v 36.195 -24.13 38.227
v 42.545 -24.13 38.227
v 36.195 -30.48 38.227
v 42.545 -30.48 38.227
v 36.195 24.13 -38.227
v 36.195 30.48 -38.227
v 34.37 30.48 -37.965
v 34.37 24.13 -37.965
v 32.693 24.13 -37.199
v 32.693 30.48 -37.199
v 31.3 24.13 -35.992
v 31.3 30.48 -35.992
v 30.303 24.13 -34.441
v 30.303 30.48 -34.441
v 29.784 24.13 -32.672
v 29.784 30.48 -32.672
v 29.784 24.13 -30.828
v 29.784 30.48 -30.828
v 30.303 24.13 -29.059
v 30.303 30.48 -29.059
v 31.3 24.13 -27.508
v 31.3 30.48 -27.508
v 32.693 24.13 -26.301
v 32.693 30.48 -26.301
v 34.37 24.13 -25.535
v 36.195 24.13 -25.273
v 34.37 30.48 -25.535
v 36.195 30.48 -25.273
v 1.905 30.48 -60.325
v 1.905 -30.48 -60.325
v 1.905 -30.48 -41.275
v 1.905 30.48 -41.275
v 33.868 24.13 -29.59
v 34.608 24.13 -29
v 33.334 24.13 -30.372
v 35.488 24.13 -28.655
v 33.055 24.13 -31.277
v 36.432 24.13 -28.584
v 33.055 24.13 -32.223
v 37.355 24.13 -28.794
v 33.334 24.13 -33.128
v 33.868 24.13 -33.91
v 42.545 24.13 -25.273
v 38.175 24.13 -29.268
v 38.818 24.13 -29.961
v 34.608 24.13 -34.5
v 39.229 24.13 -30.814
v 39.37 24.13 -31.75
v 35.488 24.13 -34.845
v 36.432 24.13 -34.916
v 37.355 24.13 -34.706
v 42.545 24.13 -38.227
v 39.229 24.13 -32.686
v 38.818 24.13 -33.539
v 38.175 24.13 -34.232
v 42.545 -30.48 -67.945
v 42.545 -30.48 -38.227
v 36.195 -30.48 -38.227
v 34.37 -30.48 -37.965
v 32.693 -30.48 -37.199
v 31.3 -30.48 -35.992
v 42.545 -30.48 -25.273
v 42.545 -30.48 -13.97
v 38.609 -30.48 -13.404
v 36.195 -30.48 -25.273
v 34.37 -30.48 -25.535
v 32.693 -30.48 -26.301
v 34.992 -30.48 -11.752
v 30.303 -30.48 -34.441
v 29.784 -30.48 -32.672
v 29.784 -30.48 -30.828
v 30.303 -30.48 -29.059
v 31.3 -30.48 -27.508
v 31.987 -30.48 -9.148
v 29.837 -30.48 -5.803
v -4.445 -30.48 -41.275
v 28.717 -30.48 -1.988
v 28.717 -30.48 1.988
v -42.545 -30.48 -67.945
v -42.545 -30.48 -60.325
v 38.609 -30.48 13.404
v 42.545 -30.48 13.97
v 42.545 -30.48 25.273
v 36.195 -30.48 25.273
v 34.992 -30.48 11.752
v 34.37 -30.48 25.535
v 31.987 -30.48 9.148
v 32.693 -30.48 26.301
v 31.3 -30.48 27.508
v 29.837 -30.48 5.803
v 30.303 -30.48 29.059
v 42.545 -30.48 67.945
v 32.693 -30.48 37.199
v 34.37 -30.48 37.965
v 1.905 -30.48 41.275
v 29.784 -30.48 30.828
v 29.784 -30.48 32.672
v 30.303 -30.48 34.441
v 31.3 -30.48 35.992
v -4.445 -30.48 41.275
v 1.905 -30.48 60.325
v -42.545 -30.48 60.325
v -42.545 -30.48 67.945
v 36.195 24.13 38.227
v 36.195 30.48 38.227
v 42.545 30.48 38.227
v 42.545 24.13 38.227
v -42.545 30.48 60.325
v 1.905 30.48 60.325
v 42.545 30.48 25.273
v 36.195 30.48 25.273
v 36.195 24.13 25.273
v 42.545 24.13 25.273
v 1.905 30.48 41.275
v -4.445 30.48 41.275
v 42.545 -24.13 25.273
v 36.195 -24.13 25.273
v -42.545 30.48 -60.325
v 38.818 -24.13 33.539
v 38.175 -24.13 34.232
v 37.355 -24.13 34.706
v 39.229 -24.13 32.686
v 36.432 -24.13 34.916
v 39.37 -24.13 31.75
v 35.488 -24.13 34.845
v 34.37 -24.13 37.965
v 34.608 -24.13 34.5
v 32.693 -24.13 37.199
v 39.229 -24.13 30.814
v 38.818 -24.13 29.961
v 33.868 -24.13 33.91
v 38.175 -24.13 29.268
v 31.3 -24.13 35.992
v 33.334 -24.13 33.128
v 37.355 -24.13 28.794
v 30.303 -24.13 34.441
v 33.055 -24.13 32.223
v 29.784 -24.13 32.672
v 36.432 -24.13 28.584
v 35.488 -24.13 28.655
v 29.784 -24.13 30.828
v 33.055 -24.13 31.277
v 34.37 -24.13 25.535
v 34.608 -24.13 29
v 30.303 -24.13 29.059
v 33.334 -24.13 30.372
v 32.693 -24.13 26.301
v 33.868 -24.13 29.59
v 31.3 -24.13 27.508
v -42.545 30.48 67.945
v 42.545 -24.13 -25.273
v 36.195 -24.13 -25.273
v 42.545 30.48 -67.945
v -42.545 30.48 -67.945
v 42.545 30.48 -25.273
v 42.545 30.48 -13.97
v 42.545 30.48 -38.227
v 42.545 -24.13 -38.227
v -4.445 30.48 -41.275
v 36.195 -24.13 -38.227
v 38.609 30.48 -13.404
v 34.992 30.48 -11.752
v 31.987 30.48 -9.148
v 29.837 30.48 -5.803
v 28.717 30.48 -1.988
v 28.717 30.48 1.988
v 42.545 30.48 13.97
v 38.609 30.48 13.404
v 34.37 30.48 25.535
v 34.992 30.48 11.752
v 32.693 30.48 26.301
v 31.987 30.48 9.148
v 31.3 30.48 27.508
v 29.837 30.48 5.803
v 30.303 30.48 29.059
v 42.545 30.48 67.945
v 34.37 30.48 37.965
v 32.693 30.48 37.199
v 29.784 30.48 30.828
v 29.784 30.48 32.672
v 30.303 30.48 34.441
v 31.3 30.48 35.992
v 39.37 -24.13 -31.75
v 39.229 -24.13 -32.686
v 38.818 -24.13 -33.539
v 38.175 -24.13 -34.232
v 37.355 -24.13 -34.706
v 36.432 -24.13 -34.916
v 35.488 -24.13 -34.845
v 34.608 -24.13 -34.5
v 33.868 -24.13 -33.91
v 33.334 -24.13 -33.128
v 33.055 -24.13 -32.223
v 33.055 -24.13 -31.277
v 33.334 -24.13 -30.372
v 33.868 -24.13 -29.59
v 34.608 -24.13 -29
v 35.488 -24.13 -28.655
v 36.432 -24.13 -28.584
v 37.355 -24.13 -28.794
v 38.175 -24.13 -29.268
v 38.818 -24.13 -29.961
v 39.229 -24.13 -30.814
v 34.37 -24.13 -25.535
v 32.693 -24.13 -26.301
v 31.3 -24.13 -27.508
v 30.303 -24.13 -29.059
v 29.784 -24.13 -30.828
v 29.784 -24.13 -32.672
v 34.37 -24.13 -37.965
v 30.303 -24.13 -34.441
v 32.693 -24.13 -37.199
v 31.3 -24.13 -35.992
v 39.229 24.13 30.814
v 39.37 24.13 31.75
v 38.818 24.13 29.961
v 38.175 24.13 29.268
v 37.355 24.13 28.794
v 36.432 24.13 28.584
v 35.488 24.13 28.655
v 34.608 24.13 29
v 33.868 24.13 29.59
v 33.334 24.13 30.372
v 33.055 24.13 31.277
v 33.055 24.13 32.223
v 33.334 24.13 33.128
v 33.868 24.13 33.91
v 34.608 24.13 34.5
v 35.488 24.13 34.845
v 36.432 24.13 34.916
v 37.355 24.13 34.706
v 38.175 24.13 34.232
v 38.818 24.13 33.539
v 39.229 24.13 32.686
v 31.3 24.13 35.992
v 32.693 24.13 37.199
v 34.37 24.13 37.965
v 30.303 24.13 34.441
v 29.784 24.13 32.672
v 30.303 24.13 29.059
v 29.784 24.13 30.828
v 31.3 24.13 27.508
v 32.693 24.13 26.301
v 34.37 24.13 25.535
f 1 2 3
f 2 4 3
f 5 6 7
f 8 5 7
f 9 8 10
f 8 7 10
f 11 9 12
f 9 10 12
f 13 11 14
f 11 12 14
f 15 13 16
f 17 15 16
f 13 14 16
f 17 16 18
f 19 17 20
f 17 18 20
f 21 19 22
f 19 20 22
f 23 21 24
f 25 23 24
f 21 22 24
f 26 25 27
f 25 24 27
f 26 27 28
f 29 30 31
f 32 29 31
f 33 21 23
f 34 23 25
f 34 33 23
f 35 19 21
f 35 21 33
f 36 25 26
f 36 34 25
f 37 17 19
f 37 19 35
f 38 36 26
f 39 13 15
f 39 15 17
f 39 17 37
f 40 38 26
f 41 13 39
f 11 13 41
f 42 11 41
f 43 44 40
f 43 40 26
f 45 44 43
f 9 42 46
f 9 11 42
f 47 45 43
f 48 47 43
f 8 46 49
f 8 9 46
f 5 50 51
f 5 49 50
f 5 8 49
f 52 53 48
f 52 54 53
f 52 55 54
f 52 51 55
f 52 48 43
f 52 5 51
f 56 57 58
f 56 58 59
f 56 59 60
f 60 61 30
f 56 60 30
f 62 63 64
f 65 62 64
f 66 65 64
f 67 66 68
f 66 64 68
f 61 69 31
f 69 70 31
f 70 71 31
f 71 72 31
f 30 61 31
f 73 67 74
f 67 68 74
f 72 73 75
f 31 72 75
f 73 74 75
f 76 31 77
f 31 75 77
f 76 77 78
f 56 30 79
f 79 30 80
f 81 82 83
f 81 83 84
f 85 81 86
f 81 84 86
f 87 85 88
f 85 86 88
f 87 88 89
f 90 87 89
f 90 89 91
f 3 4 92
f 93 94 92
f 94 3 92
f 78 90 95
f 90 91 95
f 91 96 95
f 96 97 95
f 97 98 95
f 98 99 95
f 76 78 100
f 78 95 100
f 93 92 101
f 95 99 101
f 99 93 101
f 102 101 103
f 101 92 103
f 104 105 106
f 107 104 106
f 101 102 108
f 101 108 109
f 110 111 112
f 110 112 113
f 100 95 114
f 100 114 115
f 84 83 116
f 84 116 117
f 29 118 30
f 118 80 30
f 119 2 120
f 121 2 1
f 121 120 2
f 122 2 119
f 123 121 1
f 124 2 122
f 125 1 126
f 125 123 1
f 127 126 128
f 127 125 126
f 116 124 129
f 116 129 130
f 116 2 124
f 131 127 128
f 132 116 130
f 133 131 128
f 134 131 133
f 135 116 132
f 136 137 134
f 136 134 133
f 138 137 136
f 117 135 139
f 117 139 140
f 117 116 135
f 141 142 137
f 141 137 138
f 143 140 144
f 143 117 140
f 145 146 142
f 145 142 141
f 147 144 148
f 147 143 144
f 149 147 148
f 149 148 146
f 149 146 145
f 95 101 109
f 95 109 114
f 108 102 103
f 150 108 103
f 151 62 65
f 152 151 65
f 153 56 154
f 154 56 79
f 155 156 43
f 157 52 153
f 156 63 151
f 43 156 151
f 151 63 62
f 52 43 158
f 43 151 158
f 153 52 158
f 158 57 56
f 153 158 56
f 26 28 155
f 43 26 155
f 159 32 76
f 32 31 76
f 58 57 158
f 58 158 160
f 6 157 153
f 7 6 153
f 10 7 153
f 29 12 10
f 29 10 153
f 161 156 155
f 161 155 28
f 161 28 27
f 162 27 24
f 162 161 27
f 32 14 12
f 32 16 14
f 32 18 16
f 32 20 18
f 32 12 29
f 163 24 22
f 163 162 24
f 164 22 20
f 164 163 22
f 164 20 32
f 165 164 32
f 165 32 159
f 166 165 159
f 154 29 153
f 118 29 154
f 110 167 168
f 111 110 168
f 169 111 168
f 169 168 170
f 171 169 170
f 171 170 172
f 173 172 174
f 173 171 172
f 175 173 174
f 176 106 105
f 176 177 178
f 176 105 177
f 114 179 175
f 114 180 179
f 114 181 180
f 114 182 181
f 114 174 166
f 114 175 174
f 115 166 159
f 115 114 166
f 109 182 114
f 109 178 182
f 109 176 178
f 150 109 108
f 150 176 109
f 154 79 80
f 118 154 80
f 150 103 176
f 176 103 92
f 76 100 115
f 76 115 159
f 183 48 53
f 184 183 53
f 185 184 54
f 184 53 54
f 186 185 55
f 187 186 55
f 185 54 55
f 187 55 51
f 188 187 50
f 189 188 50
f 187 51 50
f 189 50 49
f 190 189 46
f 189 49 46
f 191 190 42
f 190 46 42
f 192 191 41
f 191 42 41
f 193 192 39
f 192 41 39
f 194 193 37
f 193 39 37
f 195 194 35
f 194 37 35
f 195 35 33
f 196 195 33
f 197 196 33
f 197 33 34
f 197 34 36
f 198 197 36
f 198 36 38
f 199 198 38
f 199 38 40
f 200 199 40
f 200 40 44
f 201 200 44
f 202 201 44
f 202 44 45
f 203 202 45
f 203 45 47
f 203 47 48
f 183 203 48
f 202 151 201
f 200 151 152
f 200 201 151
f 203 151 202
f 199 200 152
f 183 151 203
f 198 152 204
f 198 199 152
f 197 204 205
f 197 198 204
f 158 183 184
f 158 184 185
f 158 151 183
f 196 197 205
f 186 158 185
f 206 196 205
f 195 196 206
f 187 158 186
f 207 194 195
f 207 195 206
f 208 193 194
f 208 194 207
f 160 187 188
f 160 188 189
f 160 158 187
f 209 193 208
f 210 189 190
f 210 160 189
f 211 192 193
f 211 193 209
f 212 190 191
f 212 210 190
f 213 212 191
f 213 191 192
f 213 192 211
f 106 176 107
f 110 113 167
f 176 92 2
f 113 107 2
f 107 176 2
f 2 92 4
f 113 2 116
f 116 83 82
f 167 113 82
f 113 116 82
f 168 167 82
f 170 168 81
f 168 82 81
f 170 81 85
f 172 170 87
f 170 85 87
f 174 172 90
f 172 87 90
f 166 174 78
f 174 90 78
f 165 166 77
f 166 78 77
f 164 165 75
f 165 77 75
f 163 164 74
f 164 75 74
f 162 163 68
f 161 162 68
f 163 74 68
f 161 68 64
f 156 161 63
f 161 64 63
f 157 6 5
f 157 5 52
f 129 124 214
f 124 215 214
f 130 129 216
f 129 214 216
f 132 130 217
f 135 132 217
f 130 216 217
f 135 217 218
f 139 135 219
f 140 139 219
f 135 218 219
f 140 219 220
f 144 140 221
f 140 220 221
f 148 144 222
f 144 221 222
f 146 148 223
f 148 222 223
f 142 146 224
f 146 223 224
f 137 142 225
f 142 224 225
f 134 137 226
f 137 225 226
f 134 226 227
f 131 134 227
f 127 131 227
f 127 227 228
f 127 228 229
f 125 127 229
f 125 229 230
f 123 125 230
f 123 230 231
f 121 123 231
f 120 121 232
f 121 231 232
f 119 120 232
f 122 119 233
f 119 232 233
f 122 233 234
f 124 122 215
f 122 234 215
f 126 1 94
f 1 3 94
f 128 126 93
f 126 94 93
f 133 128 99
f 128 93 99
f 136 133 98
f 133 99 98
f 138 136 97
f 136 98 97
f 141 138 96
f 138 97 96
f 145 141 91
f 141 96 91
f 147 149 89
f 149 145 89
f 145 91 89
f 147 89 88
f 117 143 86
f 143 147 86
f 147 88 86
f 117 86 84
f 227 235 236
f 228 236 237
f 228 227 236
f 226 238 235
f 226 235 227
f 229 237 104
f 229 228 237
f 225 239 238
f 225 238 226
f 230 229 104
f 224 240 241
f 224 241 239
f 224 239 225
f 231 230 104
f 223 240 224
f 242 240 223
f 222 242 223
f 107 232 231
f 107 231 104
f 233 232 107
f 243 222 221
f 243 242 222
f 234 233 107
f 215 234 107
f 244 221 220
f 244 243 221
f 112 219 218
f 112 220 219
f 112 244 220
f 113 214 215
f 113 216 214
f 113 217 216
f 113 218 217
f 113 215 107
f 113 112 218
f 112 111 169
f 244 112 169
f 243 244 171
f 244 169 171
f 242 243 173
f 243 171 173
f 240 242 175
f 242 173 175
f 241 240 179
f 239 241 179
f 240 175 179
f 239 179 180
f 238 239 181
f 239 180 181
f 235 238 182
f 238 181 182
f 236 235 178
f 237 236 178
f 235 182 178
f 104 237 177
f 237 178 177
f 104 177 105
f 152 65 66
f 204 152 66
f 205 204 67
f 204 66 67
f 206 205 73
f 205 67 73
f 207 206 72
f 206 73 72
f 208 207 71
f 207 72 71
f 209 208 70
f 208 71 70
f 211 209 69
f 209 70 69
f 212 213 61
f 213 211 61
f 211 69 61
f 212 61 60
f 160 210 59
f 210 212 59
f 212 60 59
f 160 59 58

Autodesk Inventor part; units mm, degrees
ref_plane "YZ Plane" through (0, 0, 0) normal (1, 0, 0) x (0, 1, 0)
ref_plane "XZ Plane" through (0, 0, 0) normal (0, 1, 0) x (-1, 0, 0)
ref_plane "XY Plane" through (0, 0, 0) normal (0, 0, 1) x (1, 0, 0)
sketch "Sketch1" plane through (0, 0, 0) normal (0, 1, 0) x (-1, 0, 0)
  line L0 (42.545, 67.945) -> (-42.545, 67.945)
  line L1 (-42.545, -67.945) -> (42.545, -67.945)
  line L2 (42.545, 67.945) -> (-42.545, -67.945) construction
  line L3 (-42.545, 67.945) -> (42.545, -67.945) construction
  line L4 (42.545, 60.325) -> (-1.905, 60.325)
  line L5 (-1.905, 60.325) -> (-1.905, 41.275)
  line L6 (36.0369, 0) -> (-87.2324, 0)
  line L7 (42.545, -60.325) -> (-1.905, -60.325)
  line L8 (-1.905, -60.325) -> (-1.905, -41.275)
  line L9 (-1.905, -41.275) -> (4.445, -41.275)
  line L10 (4.445, 41.275) -> (4.445, -41.275)
  line L11 (-1.905, 41.275) -> (4.445, 41.275)
  line L12 (42.545, -67.945) -> (42.545, -60.325)
  line L13 (42.545, 60.325) -> (42.545, 67.945)
  arc A0 (-42.545, -13.97) -> (-42.545, 13.97) centre (-42.545, 0) ccw
  line L14 (-42.545, 67.945) -> (-42.545, 13.97)
  line L15 (-42.545, -13.97) -> (-42.545, -67.945)
  point P0 (0, 0)
  dimension "d0" = 85.09
  dimension "d2" = 7.62
  dimension "d4" = 19.05
  dimension "d5" = 7.62
  dimension "d6" = 6.35
  dimension "d7" = 135.89
  dimension "d8" = 44.45
  dimension "d9" = 27.94
  dimension "d10" = 53.975
  dimension "d11" = 53.975
extrude "Extrusion1" add sketch "Sketch1" along normal mid plane 60.96
sketch "Sketch2" plane through (0, 30.48, 0) normal (0, 1, 0) x (1, 0, 0)
  arc A0 (36.195, -25.273) -> (36.195, -38.227) centre (36.195, -31.75) ccw
  line L0 (36.195, -38.227) -> (42.545, -38.227)
  line L1 (36.195, -25.273) -> (42.545, -25.273)
  line L2 (42.545, 13.97) -> (42.545, 67.945) projected
  line L3 (42.545, -38.227) -> (42.545, -25.273)
  line L4 (42.545, -67.945) -> (42.545, -13.97) projected
  line L5 (-51.5832, 0) -> (64.091, 0)
  line L6 (-42.545, -67.945) -> (42.545, -67.945) projected
  arc A1 (36.195, 38.227) -> (36.195, 25.273) centre (36.195, 31.75) ccw
  line L7 (36.195, 38.227) -> (42.545, 38.227)
  line L8 (36.195, 25.273) -> (42.545, 25.273)
  line L9 (42.545, 38.227) -> (42.545, 25.273)
  point P0 (0, 0)
  point P1 (36.195, 47.3075)
  point P2 (36.195, 34.6075)
  point P3 (42.545, 25.273)
  dimension "d15" = 12.954
  dimension "d23" = 67.945
  dimension "d24" = 63.5
  dimension "d25" = 6.35
  dimension "d26" = 12.954
extrude "Extrusion2" cut sketch "Sketch2" against normal blind 6.35
mirror "Mirror1" about plane through (0, 0, 0) normal (0, 1, 0) of "Extrusion2"
sketch "Sketch3" plane through (0, 24.13, 0) normal (0, 1, 0) x (1, 0, 0)
  arc A0 (36.195, -25.273) -> (36.195, -38.227) centre (36.195, -31.75) ccw projected
  circle A1 centre (36.195, -31.75) radius 3.175
  line L0 (-42.9578, 0) -> (76.8761, 0)
  circle A2 centre (36.195, 31.75) radius 3.175
  point P0 (0, 0)
  dimension "d19" = 6.35
extrude "Extrusion3" cut sketch "Sketch3" against normal through all
sketch "Sketch4" plane through (-42.545, 30.48, 67.945) normal (0, 0, 1) x (1, 0, 0)
  point P0 (42.545, -30.48)
properties part number "Relaxation chamber holder"
